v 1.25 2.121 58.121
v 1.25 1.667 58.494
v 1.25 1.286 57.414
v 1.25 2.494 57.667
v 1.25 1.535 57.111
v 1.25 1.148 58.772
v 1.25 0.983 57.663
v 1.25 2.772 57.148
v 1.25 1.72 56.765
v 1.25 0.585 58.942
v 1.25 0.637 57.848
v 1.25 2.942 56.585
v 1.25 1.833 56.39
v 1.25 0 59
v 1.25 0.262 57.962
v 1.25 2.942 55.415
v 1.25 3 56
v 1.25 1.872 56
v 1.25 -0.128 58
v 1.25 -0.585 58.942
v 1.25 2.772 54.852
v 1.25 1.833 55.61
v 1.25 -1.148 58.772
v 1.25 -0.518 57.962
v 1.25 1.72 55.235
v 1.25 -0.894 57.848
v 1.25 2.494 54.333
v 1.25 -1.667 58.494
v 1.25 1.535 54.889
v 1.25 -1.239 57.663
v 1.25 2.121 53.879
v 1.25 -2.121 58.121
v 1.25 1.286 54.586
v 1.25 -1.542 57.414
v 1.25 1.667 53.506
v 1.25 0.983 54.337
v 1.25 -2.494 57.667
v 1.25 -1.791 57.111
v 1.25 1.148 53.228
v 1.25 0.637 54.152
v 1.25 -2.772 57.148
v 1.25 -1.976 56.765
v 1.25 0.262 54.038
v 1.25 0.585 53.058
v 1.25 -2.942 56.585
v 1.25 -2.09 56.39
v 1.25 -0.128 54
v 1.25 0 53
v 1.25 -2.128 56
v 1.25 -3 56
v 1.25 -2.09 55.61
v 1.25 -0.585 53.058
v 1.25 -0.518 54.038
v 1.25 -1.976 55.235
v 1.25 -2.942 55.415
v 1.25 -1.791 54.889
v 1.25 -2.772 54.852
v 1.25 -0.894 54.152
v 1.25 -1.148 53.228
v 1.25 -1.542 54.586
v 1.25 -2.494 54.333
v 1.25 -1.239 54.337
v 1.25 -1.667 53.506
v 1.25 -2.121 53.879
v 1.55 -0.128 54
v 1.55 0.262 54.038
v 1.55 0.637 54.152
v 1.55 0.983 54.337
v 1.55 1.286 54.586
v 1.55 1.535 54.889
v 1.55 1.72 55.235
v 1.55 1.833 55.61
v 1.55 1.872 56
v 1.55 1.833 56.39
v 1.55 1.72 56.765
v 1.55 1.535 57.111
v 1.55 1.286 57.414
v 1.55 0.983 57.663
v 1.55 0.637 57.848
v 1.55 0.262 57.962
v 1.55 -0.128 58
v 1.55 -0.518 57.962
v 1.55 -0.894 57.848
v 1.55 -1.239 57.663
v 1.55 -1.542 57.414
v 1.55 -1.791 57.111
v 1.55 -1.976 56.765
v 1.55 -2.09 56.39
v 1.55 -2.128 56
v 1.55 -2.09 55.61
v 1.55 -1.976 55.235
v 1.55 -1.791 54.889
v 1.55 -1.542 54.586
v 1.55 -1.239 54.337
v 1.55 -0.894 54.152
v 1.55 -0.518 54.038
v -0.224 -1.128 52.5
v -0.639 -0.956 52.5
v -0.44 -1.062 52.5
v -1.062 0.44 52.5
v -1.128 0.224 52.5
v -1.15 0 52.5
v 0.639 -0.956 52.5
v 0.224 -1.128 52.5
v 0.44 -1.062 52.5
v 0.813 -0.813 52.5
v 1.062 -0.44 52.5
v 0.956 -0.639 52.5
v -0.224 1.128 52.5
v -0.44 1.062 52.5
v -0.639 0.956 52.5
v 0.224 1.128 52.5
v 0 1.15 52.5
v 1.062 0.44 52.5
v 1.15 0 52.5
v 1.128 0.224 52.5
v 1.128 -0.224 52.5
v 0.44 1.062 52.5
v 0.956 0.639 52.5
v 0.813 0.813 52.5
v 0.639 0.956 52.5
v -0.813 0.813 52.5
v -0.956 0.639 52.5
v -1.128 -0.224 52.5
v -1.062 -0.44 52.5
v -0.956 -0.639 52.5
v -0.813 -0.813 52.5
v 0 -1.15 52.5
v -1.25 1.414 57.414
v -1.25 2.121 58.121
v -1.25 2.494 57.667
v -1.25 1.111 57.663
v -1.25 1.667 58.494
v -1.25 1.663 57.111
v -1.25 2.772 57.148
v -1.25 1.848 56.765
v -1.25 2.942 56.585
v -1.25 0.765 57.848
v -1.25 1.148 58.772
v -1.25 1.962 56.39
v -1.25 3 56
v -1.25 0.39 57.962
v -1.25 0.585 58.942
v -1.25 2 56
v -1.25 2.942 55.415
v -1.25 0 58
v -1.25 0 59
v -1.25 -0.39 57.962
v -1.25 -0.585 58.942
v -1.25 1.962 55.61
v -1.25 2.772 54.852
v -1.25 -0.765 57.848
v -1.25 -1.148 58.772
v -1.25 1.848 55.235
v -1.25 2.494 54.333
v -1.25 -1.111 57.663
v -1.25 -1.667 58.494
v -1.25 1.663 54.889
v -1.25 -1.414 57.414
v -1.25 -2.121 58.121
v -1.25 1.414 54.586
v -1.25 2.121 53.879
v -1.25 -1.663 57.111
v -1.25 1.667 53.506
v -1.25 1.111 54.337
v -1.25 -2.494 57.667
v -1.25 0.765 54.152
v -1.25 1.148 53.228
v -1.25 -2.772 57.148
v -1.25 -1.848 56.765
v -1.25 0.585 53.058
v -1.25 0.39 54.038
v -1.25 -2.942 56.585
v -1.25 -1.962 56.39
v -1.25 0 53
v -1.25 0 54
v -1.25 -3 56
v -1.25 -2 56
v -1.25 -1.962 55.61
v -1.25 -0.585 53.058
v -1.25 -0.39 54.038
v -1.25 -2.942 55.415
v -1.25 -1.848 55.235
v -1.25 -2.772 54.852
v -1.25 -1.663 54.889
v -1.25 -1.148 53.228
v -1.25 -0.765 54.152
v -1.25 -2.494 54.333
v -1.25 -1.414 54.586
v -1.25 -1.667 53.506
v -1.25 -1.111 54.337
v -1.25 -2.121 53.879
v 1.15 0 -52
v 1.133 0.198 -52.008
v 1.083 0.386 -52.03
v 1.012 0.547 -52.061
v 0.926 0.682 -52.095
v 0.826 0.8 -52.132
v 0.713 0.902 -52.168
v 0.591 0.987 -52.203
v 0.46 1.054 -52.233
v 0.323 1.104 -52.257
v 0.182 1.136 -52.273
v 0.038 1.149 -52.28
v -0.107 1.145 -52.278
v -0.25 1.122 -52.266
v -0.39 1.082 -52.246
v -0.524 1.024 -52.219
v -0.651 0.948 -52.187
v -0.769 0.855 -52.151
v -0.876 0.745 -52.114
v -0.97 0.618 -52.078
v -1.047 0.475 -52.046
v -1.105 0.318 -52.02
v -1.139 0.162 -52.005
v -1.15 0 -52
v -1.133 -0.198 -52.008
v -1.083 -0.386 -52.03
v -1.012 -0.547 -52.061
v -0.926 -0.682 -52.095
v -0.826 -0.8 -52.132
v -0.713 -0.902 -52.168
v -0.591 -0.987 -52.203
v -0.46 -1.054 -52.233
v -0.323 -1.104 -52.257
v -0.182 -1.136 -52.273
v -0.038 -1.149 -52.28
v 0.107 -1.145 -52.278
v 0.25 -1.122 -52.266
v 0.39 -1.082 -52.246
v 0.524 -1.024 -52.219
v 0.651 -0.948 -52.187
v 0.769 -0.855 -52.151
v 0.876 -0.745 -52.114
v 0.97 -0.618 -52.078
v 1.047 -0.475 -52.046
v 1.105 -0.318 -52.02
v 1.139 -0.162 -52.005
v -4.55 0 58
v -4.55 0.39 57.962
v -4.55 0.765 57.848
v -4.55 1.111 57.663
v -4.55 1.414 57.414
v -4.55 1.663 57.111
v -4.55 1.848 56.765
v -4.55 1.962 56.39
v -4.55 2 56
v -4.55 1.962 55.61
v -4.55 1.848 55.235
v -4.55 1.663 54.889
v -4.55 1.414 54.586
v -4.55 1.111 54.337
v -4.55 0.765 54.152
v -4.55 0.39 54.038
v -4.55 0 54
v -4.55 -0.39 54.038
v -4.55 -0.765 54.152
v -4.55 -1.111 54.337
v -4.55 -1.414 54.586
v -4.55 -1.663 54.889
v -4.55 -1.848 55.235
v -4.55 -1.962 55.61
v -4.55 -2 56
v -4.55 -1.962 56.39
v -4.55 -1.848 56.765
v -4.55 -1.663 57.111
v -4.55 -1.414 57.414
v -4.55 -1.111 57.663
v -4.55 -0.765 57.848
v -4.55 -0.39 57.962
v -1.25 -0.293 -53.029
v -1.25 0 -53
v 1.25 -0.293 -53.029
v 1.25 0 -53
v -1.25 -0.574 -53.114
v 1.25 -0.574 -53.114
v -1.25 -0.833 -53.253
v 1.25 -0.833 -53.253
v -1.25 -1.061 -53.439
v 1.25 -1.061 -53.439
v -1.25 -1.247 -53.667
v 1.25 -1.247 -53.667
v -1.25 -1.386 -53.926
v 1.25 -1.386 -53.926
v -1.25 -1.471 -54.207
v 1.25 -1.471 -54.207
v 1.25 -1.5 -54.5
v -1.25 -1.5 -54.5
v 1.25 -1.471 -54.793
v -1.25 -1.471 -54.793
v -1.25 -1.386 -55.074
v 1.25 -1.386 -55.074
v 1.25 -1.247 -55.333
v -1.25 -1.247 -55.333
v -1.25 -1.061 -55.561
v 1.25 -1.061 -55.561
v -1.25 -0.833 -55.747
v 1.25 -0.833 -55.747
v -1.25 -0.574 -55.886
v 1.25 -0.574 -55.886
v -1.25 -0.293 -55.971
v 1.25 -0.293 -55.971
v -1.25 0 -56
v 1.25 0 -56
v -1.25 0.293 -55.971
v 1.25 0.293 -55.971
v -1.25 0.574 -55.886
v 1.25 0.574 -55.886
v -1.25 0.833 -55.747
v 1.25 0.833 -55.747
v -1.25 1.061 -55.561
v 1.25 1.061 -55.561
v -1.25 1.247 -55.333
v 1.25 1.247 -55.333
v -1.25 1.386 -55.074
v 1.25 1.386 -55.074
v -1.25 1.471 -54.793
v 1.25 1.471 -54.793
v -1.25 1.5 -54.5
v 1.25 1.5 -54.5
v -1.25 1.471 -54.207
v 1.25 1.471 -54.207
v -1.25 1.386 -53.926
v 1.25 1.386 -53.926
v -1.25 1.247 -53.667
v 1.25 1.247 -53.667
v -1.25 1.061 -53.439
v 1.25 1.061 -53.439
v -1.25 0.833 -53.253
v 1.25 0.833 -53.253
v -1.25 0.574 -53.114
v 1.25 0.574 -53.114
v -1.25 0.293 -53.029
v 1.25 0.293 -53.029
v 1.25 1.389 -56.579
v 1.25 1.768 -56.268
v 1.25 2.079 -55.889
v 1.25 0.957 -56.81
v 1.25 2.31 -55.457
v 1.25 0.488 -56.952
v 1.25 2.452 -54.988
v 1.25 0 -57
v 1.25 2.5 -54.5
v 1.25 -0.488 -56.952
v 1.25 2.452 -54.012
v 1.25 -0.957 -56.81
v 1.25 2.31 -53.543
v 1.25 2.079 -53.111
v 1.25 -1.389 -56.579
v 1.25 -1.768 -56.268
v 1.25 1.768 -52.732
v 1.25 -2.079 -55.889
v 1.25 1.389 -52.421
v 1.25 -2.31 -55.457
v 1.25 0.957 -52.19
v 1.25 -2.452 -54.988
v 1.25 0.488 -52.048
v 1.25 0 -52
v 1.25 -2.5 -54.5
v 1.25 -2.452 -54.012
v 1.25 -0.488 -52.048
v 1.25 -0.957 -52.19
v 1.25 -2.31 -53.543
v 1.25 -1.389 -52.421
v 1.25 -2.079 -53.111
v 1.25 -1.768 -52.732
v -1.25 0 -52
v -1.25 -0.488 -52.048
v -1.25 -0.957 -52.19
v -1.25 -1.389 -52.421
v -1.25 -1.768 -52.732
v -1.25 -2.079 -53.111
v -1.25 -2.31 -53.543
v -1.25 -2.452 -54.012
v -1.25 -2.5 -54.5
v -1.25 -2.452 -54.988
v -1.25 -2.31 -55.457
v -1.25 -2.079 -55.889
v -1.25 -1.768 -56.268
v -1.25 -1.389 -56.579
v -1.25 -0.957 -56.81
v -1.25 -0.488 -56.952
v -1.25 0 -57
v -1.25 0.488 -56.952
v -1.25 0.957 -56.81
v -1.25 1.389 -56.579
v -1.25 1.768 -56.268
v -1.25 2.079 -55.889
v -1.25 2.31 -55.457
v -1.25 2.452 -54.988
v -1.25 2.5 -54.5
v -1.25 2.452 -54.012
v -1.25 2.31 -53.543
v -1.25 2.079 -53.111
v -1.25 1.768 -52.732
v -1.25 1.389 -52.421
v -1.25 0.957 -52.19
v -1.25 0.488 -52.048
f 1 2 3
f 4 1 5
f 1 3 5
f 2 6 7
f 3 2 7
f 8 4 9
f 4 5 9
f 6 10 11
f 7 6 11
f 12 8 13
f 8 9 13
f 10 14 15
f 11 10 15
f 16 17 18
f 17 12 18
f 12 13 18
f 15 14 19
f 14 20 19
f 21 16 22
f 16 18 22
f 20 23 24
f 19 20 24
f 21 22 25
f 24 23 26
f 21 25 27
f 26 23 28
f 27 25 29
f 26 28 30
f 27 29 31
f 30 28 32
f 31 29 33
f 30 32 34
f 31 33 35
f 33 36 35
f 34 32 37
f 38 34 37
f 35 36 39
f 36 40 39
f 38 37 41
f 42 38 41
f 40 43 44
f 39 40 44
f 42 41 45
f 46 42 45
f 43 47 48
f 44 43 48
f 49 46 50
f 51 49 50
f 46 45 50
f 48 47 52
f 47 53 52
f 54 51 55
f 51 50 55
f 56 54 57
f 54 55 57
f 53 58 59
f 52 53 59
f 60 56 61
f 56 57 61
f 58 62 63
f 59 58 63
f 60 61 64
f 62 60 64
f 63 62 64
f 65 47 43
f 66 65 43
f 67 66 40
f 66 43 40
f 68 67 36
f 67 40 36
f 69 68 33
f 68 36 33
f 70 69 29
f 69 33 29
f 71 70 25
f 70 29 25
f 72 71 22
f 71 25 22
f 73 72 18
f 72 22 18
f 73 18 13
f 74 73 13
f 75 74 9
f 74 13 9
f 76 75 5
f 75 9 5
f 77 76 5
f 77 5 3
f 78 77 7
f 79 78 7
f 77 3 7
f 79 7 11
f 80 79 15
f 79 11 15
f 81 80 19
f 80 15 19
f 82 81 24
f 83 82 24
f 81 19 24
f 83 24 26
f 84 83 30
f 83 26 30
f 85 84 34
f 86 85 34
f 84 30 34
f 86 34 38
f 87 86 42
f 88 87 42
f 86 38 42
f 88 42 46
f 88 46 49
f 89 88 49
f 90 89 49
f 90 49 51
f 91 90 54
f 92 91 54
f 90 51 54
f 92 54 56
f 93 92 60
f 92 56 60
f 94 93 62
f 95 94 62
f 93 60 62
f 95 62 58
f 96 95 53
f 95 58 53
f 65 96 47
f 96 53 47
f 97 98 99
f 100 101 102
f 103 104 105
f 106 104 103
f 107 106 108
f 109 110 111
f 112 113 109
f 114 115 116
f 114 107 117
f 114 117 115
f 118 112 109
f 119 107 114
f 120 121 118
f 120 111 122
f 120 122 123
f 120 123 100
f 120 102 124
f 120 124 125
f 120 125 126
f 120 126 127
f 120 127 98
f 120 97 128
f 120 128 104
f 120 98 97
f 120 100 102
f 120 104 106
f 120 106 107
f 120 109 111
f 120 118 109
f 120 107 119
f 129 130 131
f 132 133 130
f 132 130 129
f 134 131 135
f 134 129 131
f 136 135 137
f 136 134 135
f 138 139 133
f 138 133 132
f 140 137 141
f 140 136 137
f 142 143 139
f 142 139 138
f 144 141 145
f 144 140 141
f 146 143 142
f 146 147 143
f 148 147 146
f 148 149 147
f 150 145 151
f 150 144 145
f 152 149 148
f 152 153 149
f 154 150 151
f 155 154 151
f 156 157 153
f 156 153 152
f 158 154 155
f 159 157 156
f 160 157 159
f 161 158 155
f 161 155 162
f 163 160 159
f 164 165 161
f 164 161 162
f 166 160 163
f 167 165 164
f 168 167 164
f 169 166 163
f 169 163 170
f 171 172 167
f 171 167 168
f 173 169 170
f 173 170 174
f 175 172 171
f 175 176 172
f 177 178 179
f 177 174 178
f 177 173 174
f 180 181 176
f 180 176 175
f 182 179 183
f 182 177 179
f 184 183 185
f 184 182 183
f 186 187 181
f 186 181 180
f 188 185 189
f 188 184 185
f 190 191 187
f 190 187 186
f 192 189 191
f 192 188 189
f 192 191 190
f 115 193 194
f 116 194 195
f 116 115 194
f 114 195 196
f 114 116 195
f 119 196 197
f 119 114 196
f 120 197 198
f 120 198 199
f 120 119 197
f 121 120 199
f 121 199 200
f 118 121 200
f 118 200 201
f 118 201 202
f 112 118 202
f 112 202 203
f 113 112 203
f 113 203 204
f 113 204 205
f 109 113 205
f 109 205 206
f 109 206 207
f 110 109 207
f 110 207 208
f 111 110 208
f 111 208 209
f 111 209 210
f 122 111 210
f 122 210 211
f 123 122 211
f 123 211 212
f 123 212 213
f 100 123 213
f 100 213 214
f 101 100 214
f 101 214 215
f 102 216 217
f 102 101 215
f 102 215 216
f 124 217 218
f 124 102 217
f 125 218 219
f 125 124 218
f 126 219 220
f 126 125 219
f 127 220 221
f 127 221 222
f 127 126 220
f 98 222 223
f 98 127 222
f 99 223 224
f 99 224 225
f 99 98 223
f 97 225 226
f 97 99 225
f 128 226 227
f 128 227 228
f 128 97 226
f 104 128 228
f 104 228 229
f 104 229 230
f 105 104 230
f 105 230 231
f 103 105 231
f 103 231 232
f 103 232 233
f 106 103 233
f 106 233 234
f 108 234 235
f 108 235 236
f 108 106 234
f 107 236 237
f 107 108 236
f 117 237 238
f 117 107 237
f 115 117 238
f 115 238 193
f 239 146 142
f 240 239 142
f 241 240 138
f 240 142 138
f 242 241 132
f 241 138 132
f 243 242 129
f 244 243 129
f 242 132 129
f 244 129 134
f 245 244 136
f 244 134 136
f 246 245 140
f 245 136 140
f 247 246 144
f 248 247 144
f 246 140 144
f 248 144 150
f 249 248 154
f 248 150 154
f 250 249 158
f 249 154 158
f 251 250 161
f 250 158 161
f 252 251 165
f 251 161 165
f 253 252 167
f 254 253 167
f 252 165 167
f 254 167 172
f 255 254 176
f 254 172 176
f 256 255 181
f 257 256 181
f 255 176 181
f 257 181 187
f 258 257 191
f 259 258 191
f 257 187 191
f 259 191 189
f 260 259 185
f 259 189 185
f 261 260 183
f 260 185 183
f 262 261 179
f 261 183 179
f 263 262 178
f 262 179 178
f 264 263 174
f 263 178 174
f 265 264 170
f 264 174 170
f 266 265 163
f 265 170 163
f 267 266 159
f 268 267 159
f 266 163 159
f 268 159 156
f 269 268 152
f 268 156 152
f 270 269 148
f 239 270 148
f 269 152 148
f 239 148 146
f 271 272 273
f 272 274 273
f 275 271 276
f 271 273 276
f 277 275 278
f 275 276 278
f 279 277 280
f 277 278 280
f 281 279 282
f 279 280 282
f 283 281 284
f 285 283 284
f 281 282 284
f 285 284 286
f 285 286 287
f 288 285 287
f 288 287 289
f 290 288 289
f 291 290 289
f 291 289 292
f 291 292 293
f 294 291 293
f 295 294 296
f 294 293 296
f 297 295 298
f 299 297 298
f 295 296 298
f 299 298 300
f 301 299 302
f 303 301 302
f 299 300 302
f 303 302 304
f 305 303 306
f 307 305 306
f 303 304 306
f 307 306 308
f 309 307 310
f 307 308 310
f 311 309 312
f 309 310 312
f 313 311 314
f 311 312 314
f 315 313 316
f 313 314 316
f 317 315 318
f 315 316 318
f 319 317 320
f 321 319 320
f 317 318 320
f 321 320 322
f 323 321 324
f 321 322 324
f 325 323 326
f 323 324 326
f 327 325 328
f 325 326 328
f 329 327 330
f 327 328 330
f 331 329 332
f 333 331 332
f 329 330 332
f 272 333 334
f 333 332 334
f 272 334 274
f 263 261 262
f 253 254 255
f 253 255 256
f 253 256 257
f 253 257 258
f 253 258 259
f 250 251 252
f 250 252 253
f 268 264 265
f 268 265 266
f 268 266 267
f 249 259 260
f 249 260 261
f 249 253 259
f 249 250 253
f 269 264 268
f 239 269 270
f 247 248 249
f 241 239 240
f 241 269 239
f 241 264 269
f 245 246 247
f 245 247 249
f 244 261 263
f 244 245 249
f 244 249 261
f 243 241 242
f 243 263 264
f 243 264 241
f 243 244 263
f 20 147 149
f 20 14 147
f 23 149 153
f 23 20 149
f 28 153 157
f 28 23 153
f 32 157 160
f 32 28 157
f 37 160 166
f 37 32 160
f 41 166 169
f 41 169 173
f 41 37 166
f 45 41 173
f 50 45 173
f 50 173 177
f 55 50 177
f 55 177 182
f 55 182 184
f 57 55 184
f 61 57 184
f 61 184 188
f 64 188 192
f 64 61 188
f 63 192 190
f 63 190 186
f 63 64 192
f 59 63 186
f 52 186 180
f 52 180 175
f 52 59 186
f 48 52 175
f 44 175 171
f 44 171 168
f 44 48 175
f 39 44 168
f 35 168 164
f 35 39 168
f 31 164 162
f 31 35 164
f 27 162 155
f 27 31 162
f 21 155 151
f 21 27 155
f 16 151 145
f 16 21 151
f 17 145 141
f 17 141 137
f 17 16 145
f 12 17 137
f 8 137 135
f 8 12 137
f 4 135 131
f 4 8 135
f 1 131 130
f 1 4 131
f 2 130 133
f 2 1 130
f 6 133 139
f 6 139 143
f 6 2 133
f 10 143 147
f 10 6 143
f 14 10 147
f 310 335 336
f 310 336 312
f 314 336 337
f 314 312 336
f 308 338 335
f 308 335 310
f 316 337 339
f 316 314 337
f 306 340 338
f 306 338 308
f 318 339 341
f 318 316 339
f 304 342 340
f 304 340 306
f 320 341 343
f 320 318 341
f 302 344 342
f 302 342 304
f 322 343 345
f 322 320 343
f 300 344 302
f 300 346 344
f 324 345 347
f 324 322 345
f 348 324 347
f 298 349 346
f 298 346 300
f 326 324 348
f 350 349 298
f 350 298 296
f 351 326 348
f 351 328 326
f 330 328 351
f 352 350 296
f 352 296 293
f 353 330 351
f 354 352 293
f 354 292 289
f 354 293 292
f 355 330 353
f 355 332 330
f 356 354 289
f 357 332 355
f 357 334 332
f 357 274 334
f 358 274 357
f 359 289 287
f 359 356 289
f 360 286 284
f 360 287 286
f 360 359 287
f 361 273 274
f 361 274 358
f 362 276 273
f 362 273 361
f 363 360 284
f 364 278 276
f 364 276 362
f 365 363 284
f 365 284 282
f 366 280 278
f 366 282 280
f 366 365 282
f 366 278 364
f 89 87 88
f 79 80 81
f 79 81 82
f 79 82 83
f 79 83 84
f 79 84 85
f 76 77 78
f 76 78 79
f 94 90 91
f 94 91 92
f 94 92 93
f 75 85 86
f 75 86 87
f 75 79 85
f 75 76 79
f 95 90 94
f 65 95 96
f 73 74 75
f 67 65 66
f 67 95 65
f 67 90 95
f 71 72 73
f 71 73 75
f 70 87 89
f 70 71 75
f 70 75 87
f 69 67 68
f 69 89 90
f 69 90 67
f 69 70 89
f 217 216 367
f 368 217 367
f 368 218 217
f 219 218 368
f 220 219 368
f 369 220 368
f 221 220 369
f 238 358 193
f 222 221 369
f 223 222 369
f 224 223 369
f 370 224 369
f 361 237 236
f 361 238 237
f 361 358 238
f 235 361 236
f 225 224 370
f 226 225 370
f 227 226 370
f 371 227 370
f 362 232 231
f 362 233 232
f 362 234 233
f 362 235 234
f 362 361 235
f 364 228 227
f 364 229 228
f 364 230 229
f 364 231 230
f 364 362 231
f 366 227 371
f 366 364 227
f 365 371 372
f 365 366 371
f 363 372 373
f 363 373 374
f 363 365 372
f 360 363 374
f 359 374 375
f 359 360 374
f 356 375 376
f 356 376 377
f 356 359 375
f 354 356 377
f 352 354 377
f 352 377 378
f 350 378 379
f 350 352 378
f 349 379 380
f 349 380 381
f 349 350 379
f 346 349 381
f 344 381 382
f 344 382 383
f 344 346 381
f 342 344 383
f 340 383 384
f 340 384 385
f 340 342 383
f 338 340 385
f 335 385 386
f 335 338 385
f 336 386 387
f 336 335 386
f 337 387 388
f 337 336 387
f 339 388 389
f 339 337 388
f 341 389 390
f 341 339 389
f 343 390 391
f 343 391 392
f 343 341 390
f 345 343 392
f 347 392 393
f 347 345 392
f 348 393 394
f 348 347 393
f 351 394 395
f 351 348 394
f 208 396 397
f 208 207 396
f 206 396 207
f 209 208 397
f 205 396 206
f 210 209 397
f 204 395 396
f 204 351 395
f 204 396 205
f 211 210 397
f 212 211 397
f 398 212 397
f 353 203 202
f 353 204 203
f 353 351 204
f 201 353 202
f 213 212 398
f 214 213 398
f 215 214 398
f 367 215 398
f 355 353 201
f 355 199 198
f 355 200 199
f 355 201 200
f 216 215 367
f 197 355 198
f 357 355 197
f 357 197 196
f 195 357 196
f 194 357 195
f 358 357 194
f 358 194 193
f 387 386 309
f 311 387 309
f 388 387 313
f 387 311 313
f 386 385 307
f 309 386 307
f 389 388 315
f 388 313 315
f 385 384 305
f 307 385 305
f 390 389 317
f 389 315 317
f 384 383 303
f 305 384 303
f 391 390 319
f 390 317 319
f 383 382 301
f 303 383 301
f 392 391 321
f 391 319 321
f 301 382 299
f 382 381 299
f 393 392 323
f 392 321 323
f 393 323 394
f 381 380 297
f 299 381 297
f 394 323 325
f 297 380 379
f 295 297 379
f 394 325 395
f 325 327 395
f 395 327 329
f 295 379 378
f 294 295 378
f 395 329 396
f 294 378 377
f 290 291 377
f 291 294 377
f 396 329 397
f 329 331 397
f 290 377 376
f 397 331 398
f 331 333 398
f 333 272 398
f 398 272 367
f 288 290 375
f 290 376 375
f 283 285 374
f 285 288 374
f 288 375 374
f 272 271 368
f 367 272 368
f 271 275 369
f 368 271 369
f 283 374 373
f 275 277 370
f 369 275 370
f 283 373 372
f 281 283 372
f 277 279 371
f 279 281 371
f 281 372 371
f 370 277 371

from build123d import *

# Parameters (mm, degrees)
SKETCH1_R           = 1.15
BOSS_EXTRUDE1_DEPTH = 52.5
SKETCH2_W           = 2.5
SKETCH2_H           = 1
SKETCH6_W           = 2.5
SKETCH6_H           = 3
SKETCH8_R           = 2
BOSS_EXTRUDE3_DEPTH = 3.3
SKETCH12_R          = 2
BOSS_EXTRUDE4_DEPTH = 0.3


with BuildPart() as part:
    # Sketch1 → Boss-Extrude1 (new, symmetric)
    with BuildSketch(Plane.XY):
        Circle(SKETCH1_R)
    extrude(amount=BOSS_EXTRUDE1_DEPTH, both=True)

    # Sketch2 → Revolve1 (revolve)
    with BuildSketch(Plane(origin=(0, 0, 0), x_dir=(1, 0, 0), z_dir=(0, 1, 0))):
        with Locations((0, 52.5)):
            Rectangle(SKETCH2_W, SKETCH2_H)
    revolve(axis=Axis((-2.676590035, 0, -54.5), (1, 0, 0)))


with BuildPart() as body_2:
    # Sketch6 → Revolve2 (revolve)
    with BuildSketch(Plane(origin=(0, 0, 0), x_dir=(1, 0, 0), z_dir=(0, 1, 0)), mode=Mode.PRIVATE) as revolve2_sk:
        with Locations((0, -54.5)):
            Rectangle(SKETCH6_W, SKETCH6_H)
    revolve(revolve2_sk.sketch.rotate(Axis((-1.25, 0, 56), (1, 0, 0)), 180), axis=Axis((-1.25, 0, 56), (1, 0, 0)))

    # Sketch8 → Boss-Extrude3 (add)
    with BuildSketch(Plane.ZY.offset(1.25)):
        with Locations((56, 0)):
            Circle(SKETCH8_R)
    extrude(amount=BOSS_EXTRUDE3_DEPTH)

    # Sketch12 → Boss-Extrude4 (add)
    with BuildSketch(Plane(origin=(1.25, 0, 0), x_dir=(0, 0, -1), z_dir=(1, 0, 0))):
        with Locations((-56, -0.12814495)):
            Circle(SKETCH12_R)
    extrude(amount=BOSS_EXTRUDE4_DEPTH)


solid = Compound([part.part, body_2.part])
